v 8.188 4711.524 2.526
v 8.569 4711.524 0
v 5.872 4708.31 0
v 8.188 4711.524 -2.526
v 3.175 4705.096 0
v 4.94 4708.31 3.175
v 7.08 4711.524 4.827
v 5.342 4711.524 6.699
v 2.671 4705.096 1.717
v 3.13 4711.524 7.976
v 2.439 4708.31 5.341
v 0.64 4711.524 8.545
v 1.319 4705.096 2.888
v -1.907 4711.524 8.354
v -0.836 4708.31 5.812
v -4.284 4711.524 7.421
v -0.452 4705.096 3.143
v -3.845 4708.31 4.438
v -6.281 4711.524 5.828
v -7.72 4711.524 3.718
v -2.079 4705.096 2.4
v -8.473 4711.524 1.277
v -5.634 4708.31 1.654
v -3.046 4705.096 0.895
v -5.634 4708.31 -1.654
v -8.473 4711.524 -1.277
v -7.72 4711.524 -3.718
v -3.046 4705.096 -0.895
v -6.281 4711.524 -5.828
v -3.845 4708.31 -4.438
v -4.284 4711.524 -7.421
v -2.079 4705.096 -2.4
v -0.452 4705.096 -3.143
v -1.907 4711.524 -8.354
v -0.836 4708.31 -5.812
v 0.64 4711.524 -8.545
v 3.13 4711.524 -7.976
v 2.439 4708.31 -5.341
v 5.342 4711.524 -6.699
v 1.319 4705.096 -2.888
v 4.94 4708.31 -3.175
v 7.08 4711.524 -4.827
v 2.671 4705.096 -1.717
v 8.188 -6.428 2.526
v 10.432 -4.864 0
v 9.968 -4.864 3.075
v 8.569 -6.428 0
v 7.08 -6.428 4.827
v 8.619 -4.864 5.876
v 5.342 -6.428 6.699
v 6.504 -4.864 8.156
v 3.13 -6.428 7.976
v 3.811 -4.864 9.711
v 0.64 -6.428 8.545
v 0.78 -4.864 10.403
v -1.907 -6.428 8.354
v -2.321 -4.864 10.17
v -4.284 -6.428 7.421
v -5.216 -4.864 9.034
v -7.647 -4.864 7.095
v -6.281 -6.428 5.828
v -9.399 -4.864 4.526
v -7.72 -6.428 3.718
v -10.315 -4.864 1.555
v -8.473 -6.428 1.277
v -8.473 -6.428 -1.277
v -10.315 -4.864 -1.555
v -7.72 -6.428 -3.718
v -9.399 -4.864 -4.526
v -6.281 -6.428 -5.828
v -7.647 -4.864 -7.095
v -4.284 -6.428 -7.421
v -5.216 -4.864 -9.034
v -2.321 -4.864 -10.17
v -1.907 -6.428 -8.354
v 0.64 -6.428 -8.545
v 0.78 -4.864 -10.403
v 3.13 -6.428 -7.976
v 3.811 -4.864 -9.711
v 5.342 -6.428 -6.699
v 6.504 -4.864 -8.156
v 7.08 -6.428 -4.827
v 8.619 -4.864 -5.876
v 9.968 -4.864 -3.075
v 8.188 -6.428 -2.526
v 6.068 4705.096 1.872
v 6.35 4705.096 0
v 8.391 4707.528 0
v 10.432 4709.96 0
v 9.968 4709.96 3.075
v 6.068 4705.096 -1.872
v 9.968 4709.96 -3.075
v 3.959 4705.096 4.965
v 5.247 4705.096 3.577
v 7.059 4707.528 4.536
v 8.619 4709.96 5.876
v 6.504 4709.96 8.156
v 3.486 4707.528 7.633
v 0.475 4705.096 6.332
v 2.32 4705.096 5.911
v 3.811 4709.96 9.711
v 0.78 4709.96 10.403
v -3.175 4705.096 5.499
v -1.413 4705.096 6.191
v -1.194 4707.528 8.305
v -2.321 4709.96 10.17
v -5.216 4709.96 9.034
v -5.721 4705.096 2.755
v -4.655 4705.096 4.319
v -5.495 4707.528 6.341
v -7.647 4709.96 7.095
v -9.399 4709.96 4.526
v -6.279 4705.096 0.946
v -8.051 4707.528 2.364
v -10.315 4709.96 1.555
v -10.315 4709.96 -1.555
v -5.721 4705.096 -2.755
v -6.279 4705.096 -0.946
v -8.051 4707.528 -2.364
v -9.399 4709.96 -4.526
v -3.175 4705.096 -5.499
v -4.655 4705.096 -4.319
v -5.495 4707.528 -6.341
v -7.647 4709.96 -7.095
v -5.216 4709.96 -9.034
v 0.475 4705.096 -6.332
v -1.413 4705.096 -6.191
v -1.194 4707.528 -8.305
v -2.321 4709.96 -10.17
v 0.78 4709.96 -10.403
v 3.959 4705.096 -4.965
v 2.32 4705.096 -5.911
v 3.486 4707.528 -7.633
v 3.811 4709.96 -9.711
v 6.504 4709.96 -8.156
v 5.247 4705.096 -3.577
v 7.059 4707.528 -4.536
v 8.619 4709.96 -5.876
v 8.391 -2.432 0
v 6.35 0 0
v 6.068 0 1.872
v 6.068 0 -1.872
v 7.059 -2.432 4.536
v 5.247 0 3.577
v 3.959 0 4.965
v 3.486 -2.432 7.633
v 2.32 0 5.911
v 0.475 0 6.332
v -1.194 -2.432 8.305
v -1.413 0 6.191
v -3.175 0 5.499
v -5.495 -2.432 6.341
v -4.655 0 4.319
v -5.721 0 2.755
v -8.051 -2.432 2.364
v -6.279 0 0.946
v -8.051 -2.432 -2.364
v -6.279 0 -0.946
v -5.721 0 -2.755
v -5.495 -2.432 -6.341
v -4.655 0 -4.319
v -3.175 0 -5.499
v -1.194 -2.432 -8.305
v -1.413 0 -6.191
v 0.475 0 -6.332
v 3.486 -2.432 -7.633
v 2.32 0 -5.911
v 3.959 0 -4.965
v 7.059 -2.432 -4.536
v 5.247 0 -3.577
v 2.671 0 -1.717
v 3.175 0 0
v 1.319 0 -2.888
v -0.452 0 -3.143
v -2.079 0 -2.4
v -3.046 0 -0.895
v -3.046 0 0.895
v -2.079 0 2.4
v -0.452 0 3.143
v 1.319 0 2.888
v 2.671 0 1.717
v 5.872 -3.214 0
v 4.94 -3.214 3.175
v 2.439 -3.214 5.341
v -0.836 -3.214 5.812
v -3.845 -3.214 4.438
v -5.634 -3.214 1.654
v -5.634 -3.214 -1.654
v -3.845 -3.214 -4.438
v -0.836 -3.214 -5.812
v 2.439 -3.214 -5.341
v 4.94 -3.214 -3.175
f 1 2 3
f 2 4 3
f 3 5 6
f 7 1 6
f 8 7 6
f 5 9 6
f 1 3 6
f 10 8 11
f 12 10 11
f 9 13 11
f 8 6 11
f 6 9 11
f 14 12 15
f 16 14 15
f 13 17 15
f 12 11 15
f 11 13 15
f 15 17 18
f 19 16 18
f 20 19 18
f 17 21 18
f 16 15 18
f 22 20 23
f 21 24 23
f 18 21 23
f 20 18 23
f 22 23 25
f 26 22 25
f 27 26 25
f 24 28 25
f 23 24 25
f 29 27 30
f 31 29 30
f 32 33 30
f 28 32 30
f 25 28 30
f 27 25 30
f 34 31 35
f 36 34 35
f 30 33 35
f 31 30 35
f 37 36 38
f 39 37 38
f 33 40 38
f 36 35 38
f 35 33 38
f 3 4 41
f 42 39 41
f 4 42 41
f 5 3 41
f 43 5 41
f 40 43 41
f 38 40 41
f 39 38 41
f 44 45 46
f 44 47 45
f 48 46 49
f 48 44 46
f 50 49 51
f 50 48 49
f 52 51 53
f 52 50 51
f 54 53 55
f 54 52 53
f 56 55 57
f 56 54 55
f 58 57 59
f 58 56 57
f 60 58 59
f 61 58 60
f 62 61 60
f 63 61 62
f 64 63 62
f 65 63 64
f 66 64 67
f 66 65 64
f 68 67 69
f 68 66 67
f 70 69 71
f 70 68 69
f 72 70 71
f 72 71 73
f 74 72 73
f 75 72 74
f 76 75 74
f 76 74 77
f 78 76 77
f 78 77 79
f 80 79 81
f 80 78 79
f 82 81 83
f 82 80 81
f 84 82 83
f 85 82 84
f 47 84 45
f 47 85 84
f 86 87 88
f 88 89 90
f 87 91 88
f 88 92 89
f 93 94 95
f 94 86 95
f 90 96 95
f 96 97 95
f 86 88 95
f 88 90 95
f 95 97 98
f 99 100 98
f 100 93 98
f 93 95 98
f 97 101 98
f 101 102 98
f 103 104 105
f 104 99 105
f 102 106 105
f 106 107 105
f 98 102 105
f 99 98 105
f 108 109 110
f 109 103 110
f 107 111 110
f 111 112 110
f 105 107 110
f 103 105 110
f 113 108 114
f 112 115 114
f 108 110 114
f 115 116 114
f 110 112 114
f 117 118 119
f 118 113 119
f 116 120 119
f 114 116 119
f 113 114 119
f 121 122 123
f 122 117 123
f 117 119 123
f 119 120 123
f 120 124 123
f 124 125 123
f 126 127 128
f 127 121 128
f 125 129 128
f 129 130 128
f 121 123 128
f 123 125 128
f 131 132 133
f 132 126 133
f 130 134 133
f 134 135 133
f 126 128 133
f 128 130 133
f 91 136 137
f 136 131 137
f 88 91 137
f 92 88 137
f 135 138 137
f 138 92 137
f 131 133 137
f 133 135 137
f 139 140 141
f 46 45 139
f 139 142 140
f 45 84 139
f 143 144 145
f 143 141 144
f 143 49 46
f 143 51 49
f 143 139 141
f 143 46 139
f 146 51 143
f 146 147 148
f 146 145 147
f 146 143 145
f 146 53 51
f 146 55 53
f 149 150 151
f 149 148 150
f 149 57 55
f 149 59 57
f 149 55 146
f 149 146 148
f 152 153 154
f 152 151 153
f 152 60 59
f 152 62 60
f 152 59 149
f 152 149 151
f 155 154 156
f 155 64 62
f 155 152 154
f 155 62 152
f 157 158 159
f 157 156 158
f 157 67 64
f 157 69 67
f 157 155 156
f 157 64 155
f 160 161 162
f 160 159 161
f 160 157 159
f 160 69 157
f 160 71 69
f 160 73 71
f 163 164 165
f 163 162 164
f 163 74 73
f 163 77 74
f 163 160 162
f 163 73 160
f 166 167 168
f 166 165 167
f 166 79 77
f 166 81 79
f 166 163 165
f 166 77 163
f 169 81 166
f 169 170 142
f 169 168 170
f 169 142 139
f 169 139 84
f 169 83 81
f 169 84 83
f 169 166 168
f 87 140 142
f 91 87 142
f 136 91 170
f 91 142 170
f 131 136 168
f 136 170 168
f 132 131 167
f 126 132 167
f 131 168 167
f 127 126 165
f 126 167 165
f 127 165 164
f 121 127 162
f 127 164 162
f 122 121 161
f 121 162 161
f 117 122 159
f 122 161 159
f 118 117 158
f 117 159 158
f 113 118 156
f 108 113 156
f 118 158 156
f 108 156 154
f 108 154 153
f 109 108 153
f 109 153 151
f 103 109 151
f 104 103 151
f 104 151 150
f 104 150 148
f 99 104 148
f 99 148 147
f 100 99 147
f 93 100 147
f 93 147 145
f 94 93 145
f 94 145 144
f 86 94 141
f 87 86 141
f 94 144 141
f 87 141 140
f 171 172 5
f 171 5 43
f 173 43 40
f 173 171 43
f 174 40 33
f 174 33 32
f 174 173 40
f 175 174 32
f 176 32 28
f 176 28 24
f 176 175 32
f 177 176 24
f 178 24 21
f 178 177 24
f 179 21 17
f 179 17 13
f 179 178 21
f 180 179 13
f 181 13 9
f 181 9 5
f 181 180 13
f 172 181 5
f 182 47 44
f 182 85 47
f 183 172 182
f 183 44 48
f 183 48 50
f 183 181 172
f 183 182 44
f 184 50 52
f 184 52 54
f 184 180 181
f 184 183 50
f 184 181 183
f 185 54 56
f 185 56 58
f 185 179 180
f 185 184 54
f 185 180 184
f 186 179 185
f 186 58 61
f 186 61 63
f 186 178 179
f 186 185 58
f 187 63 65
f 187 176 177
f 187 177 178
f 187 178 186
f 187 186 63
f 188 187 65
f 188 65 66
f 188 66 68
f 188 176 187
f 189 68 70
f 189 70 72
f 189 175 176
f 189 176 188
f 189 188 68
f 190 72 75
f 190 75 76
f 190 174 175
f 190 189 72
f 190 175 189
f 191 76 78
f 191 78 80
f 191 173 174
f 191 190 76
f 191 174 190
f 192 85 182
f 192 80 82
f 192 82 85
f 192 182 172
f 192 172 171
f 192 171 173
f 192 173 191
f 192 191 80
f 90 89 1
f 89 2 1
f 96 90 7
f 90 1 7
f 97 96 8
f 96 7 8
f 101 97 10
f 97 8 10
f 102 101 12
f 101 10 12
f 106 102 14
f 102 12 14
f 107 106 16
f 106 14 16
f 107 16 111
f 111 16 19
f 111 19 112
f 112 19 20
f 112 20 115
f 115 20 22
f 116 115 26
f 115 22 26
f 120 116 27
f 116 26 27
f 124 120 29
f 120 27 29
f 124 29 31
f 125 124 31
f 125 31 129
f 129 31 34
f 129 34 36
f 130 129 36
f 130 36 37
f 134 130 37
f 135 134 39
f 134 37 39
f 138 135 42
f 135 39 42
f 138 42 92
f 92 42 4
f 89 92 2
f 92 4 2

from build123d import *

# Parameters (mm, degrees)
SKETCH1_R           = 6.35
SKETCH1_R_2         = 3.175
BOSS_EXTRUDE1_DEPTH = 4705.096


with BuildPart() as part:
    # Sketch1 → Boss-Extrude1 (new body)
    with BuildSketch(Plane(origin=(0, 0, 0), x_dir=(1, 0, 0), z_dir=(0, 1, 0))):
        Circle(SKETCH1_R)
        Circle(SKETCH1_R_2, mode=Mode.SUBTRACT)
    extrude(amount=BOSS_EXTRUDE1_DEPTH)

    # Sketch2 → Revolve1 (revolve)
    with BuildSketch(Plane.XY):
        Polygon((6.35, 4705.096), (10.431701322, 4709.960382214), (8.568534839, 4711.523764522), (3.175, 4705.096), align=None)
    revolve1 = revolve(axis=Axis((0, 4946.833252748, 0), (0, -1, 0)))

    # Mirror1: Revolve1 across plane
    add(revolve1.mirror(Plane.ZX.offset(2352.548)))


solid = part.part
